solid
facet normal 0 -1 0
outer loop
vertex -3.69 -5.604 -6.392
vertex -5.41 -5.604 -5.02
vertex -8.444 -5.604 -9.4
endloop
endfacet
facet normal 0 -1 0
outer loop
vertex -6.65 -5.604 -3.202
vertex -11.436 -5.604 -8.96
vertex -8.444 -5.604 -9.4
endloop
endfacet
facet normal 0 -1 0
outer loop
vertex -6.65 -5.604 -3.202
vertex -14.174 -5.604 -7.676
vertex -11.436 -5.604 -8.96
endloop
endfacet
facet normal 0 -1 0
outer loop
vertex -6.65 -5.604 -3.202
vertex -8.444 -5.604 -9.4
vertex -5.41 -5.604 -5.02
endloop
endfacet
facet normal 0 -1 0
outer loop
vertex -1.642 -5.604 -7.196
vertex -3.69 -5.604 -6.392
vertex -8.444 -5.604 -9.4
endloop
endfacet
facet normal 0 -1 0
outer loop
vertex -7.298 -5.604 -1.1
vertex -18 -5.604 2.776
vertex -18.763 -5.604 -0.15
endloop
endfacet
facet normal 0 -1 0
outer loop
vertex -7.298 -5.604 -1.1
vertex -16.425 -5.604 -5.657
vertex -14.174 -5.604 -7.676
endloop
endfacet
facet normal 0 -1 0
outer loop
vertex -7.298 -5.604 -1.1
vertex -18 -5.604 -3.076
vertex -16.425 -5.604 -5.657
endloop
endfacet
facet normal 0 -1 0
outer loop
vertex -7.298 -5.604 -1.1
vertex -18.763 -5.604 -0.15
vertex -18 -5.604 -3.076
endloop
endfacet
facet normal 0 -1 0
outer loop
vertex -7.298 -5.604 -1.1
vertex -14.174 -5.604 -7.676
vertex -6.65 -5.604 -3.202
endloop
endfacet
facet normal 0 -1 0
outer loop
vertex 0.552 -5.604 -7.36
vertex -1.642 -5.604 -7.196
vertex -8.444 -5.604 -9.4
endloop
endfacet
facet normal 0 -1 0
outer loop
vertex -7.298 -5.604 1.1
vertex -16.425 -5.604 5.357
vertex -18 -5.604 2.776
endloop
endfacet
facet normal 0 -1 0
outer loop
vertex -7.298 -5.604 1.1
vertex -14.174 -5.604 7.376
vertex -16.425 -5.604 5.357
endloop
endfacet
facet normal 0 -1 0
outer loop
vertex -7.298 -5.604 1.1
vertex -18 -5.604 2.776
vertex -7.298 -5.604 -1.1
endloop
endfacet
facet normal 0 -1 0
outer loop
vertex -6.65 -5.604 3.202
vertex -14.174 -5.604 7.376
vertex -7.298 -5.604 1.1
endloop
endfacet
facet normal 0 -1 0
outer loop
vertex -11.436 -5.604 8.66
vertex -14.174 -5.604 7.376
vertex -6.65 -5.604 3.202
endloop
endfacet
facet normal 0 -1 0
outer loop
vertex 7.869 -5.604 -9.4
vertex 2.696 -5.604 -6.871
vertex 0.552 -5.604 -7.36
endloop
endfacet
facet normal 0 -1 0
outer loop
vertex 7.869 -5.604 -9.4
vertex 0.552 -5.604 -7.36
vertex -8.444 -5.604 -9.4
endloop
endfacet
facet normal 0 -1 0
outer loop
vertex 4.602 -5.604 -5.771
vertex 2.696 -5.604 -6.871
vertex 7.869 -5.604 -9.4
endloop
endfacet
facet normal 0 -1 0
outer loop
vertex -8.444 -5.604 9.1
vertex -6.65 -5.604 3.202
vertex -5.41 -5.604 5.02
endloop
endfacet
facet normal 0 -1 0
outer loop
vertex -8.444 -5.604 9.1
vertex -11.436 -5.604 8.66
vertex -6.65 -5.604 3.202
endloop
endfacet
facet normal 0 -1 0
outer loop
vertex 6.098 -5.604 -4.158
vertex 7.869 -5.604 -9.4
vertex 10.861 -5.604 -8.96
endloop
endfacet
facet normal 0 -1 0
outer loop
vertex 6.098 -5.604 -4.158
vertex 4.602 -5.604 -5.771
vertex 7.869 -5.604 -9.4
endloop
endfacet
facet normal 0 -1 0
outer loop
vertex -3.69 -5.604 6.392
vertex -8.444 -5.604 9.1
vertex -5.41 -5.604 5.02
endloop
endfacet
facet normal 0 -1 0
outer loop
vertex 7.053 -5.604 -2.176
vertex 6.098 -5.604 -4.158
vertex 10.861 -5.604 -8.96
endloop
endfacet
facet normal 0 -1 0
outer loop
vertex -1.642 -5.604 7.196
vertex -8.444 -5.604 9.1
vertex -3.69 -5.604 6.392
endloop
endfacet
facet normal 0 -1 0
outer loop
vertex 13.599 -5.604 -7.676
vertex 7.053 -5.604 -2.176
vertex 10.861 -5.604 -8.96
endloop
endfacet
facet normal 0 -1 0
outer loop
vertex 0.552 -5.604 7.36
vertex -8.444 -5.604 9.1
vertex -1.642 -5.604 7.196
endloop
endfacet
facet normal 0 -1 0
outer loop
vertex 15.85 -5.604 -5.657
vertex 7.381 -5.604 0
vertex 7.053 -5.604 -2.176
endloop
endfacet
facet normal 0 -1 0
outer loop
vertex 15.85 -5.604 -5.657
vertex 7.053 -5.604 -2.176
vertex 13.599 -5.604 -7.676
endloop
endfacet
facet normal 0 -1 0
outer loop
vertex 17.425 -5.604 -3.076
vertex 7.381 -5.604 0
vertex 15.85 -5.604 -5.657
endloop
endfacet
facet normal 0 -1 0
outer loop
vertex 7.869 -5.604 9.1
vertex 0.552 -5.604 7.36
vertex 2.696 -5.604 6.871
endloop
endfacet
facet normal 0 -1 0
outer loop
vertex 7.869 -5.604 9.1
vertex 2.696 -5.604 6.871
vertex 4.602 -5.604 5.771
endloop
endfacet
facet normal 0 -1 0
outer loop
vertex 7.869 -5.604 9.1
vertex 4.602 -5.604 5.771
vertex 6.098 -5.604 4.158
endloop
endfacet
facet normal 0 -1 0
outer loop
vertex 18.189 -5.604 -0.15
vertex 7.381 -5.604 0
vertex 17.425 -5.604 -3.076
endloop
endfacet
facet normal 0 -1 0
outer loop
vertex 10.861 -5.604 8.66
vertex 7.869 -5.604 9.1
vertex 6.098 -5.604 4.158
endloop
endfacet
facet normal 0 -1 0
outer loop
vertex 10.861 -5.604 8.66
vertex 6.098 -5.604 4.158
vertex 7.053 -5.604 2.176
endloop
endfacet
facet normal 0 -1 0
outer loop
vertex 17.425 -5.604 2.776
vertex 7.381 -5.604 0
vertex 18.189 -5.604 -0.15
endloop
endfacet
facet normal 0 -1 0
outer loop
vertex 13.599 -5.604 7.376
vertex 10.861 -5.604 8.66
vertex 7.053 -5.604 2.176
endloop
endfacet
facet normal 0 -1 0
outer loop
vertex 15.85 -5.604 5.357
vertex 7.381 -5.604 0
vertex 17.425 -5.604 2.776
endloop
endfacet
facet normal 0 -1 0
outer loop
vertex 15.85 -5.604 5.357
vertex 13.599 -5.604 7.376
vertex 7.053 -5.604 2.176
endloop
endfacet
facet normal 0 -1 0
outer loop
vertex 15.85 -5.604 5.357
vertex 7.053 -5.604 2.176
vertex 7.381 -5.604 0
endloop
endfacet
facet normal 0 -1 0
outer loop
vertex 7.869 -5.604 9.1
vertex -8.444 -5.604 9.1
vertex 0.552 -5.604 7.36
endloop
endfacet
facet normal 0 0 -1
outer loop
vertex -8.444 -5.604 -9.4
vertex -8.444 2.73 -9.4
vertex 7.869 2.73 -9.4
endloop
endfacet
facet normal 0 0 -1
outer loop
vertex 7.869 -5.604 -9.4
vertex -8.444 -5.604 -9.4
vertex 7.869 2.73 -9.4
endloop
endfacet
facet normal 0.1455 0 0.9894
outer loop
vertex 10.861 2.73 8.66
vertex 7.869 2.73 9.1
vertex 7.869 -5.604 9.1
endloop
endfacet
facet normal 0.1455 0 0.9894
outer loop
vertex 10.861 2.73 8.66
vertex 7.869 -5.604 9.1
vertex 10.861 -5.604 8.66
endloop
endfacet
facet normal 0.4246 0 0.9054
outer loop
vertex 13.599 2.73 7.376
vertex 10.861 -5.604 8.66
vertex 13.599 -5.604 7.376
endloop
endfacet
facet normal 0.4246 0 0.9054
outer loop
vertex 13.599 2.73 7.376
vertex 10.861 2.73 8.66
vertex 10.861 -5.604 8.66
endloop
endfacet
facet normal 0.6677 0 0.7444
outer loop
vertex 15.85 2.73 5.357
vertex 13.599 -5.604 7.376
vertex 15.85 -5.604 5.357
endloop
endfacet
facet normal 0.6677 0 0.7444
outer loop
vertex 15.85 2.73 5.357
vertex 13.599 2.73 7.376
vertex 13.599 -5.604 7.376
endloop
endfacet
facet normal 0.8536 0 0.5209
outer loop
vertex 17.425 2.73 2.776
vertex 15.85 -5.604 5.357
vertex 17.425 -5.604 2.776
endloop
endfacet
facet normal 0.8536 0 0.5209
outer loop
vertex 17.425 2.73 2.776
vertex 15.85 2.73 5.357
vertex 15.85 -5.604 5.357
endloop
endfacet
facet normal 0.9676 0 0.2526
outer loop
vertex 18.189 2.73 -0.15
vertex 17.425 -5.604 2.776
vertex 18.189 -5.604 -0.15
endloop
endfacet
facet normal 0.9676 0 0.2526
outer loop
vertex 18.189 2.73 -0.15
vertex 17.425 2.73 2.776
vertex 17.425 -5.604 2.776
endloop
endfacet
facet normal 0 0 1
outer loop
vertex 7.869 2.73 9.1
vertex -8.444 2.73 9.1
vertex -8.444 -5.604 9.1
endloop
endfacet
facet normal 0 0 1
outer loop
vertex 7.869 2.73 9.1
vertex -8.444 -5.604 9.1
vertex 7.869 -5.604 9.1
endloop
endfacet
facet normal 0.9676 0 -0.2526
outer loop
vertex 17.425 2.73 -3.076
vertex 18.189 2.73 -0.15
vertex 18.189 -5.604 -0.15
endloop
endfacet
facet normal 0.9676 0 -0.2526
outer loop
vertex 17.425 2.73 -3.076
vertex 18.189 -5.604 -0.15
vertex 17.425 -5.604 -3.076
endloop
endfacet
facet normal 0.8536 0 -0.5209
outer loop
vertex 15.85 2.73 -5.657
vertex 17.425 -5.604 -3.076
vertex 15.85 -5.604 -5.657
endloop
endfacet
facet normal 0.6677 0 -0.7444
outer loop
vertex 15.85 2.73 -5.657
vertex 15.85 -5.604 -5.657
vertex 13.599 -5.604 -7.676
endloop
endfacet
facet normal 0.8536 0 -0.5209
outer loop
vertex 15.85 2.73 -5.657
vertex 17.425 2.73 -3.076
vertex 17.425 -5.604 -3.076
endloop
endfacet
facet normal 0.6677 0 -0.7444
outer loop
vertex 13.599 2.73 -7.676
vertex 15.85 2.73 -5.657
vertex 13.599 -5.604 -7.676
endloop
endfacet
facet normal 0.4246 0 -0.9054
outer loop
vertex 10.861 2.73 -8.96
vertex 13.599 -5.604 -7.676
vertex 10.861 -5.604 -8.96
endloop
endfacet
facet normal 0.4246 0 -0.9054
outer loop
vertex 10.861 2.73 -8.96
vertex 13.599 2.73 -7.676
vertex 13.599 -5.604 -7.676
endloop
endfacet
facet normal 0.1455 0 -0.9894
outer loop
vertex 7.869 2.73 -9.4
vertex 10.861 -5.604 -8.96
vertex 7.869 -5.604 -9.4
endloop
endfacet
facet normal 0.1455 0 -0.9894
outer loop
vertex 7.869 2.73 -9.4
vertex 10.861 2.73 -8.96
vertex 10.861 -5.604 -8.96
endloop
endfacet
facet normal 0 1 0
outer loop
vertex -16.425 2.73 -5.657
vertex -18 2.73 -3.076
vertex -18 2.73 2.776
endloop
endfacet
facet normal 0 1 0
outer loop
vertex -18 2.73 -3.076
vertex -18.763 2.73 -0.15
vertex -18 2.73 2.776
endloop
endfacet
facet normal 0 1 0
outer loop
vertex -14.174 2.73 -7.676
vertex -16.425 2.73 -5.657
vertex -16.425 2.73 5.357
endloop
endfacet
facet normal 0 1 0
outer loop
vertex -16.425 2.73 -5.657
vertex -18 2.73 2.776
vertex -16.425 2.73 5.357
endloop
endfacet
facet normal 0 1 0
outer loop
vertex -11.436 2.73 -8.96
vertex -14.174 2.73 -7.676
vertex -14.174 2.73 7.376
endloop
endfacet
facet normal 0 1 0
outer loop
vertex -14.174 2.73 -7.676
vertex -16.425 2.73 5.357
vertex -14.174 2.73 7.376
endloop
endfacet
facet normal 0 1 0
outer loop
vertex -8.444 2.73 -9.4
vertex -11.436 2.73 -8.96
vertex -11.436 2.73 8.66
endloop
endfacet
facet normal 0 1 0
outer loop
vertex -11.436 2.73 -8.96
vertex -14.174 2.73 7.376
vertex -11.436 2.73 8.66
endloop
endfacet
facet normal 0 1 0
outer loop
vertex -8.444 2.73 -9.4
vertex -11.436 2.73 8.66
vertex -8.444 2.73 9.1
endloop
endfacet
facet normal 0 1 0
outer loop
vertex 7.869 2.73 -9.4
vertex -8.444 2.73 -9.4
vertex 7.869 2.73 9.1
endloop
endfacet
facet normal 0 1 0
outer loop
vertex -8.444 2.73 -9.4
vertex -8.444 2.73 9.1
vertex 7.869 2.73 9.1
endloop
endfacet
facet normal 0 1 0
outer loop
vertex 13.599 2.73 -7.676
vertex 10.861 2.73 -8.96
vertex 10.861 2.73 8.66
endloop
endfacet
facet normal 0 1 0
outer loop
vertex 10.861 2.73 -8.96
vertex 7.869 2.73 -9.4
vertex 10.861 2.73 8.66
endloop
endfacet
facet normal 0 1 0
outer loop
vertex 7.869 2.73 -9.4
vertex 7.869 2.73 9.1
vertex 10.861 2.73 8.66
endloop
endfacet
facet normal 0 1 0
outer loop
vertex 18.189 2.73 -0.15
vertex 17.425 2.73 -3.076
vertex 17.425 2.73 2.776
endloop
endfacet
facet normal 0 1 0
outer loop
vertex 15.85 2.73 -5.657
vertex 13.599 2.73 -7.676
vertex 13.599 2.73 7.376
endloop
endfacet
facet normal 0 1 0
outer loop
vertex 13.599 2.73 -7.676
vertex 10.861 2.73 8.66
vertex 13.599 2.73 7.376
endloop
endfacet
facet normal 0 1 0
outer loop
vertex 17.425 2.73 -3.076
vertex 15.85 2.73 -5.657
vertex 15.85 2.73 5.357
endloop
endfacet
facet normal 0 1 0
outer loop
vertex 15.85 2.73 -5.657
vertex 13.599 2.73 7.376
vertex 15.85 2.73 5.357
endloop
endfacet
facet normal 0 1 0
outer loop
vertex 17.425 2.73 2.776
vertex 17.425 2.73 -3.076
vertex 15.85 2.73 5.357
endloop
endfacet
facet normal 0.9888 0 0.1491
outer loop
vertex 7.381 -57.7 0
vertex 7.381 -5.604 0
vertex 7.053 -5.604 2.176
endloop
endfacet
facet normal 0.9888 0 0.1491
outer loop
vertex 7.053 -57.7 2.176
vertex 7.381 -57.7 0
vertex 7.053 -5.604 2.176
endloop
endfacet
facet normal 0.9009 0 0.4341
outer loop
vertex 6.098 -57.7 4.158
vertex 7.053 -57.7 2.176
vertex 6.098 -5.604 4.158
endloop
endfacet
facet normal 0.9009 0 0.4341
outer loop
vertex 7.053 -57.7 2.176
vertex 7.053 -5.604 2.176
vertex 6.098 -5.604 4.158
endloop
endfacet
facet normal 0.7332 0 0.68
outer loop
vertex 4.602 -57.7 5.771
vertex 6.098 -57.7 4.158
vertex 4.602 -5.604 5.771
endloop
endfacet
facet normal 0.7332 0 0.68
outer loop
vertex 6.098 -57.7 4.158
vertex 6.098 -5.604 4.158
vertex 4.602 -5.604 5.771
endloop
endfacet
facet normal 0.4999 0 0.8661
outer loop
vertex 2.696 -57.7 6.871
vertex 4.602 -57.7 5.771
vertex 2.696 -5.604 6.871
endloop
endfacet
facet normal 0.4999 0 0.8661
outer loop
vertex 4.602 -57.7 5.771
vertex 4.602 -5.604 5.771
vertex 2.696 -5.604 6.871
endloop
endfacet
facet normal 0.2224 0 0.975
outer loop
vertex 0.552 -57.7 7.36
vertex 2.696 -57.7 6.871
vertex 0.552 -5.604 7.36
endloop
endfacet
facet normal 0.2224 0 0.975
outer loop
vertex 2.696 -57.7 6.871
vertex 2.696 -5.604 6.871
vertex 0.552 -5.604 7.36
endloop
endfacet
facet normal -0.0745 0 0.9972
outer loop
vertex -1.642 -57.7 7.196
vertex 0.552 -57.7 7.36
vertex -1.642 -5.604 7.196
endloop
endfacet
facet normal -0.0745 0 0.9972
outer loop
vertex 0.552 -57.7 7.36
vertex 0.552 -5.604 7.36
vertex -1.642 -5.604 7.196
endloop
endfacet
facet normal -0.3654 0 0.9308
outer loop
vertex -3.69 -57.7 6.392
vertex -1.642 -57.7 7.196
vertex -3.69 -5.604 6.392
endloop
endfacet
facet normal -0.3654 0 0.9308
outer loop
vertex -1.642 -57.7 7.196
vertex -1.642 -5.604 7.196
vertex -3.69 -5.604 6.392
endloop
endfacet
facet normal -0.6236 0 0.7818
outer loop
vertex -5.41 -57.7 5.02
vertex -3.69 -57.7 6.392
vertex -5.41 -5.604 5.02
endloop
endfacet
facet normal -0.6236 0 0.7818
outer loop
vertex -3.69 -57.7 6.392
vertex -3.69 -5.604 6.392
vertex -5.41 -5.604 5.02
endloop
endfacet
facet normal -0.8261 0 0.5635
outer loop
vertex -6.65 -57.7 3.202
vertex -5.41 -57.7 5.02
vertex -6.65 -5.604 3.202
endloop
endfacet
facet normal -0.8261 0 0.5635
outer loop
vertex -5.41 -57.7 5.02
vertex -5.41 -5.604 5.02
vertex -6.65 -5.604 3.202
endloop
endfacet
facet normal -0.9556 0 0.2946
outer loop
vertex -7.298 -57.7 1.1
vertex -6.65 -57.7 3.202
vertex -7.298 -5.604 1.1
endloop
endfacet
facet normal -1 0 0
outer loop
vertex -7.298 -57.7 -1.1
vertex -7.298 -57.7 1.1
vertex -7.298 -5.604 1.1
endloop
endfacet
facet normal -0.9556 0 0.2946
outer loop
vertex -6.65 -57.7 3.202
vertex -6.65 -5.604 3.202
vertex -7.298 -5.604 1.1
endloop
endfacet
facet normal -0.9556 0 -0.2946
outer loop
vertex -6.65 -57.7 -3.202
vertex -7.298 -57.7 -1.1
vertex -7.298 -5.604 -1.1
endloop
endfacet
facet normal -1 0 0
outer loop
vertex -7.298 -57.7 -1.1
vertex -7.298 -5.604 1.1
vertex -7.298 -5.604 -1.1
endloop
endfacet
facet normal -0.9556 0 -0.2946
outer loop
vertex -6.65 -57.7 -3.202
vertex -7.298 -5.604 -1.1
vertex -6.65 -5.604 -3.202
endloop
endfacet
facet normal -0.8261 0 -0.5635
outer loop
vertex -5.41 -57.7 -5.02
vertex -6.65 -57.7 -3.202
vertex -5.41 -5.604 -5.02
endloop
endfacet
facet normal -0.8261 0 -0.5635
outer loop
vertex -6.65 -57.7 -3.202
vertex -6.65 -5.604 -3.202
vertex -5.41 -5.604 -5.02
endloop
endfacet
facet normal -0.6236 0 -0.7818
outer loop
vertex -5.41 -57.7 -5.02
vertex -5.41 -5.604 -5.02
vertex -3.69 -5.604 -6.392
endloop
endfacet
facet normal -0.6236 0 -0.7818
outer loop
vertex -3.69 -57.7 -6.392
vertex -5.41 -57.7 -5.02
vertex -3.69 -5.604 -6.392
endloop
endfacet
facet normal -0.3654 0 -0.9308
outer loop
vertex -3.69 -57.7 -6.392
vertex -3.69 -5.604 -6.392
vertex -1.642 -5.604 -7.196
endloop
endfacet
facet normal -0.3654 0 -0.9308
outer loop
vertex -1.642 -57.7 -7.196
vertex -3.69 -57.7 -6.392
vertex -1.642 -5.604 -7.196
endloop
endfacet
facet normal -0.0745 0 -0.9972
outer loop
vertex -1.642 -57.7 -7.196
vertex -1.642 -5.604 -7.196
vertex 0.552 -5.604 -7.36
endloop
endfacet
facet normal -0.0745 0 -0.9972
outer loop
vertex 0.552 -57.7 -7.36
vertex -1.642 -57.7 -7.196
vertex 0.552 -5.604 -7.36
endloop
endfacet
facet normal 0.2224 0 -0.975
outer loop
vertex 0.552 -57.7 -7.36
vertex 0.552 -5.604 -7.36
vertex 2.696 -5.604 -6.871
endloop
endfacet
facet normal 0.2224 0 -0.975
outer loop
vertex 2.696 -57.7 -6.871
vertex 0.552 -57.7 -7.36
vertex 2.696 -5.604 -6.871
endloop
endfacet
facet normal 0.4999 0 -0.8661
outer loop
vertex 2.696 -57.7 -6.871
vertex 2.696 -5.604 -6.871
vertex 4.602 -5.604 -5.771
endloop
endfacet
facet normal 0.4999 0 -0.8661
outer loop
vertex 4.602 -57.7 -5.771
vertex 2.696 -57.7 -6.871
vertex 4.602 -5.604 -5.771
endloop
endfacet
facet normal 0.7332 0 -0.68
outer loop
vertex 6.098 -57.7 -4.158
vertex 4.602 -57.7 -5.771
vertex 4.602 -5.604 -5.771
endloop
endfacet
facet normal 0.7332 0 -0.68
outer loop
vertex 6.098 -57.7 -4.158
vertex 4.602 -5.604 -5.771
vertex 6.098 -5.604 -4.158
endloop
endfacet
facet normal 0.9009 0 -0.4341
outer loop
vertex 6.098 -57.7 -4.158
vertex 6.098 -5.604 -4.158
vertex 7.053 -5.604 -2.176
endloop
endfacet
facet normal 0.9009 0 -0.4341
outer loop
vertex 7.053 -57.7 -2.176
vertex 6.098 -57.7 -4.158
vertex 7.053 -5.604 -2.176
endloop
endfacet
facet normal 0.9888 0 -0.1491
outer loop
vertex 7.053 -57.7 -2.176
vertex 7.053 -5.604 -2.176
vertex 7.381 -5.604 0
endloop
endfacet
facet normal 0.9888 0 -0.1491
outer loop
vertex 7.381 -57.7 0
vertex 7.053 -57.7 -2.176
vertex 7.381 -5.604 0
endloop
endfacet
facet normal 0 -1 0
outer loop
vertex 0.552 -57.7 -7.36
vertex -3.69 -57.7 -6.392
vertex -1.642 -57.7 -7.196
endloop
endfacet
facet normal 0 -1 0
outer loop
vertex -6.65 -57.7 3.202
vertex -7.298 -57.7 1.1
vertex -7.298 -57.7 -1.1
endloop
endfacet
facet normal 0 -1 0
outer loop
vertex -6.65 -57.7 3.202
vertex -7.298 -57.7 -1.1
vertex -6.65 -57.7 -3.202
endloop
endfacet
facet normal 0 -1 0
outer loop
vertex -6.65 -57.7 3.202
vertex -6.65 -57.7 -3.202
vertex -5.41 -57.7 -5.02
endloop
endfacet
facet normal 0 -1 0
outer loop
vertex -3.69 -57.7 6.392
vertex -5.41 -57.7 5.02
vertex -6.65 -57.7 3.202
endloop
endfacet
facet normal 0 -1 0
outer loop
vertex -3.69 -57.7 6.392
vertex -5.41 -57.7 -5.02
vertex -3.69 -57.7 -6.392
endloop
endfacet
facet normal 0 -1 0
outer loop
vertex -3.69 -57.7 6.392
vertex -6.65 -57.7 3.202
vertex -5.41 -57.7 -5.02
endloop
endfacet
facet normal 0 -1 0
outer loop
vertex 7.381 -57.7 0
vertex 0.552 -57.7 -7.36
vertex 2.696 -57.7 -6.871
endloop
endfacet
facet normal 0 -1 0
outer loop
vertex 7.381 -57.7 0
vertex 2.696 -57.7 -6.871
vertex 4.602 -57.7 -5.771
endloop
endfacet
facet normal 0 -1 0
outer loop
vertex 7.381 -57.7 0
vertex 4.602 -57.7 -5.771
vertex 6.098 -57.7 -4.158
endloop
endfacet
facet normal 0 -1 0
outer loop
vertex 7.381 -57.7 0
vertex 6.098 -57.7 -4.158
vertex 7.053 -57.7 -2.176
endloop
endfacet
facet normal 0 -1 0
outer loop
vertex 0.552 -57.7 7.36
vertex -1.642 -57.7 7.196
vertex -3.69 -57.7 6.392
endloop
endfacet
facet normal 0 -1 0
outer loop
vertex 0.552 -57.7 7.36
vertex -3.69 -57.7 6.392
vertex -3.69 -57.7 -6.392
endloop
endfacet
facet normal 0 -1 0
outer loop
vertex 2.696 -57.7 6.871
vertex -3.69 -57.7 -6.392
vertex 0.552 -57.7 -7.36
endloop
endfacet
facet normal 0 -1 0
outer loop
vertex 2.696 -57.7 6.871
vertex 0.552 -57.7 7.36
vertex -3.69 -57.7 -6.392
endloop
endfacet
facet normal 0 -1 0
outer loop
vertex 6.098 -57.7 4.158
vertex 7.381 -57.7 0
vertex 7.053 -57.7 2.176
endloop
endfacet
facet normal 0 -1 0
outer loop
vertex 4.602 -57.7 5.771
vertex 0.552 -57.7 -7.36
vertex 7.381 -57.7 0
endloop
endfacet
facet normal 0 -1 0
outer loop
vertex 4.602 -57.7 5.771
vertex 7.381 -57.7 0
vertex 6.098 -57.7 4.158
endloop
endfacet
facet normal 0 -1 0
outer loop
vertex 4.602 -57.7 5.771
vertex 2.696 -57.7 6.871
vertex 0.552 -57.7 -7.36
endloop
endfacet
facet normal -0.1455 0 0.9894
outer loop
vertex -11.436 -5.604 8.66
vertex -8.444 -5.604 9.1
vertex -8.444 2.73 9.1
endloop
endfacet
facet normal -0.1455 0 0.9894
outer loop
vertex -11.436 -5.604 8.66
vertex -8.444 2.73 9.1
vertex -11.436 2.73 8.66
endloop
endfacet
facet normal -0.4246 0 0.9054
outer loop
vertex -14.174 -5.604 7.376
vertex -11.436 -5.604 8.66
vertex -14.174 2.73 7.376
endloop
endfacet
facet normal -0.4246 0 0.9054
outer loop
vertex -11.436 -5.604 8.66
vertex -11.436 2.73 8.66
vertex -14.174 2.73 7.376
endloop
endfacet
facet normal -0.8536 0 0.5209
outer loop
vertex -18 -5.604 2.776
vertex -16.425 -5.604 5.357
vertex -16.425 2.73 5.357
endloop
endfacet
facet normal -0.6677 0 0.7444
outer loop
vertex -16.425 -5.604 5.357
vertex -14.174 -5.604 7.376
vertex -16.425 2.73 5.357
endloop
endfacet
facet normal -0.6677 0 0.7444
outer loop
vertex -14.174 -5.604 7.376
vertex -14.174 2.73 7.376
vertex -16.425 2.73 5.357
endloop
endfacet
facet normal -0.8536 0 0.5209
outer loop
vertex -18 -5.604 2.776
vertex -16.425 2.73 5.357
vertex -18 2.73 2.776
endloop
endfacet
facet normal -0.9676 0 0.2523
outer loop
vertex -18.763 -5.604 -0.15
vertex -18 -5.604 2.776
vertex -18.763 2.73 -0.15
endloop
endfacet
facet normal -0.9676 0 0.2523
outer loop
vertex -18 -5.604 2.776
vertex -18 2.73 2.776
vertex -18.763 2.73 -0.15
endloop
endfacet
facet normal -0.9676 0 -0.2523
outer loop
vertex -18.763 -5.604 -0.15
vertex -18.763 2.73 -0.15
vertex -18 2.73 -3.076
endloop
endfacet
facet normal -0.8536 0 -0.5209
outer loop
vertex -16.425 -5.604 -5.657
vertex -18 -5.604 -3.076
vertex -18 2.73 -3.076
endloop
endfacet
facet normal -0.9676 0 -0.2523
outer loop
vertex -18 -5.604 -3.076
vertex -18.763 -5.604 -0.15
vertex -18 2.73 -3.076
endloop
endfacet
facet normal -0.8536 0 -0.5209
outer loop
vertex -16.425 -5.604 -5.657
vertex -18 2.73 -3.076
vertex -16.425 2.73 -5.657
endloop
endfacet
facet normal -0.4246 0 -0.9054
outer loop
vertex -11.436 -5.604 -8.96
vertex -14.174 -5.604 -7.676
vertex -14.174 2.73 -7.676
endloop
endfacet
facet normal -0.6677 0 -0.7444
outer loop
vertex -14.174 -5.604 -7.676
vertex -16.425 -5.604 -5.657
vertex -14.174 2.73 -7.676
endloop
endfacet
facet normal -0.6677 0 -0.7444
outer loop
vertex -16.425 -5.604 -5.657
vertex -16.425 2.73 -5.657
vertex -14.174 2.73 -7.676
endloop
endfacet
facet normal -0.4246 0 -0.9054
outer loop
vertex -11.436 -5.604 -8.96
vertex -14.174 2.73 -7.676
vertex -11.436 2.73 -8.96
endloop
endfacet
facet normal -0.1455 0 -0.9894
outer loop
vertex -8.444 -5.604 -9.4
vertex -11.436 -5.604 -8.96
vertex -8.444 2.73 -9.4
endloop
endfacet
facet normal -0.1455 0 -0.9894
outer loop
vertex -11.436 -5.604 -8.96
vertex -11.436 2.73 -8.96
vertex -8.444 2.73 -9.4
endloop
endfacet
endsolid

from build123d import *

# Parameters (mm, degrees)
F0_R          = 7.380765
F1_DEPTH      = 57.7
F2_W          = 37.0757319033
F2_H          = 8.3348543849
F3_DEPTH      = 9.1
F3_DEPTH_BACK = 9.4
F4_T1_DEPTH   = 60.2404459759


# Not quite as in the source:
# - a fillet or chamfer that OpenCascade refuses, or shapes differently, is made with other operations: its cross-section is extruded or revolved along the edge and cut away or added


with BuildPart() as f1:
    # F0 (on Front) → F1 (new body)
    with BuildSketch(Plane.XZ):
        Circle(F0_R)
    extrude(amount=F1_DEPTH)

    # F2 (on Top) → F3 (join, two sides)
    with BuildSketch(Plane.XY) as f3_sk:
        with Locations((-0.2874098718, -1.4370438876)):
            Rectangle(F2_W, F2_H)
    extrude(amount=F3_DEPTH)
    extrude(f3_sk.sketch, amount=-F3_DEPTH_BACK)

    # F4: fillet of radius 10.3811183182 on 4 edges, made by hand

    # F4_s2 → F4_t1 (cut)
    with BuildSketch(Plane.XZ.offset(-28.6831791004)):
        with BuildLine():
            ThreePointArc((-18.8252758235, 0.9811183182), (-15.7847166644, -6.3594408409), (-8.4441575053, -9.4))
            Line((-8.4441575053, -9.4), (-18.8252758235, -9.4))
            Line((-18.8252758235, -9.4), (-18.8252758235, 0.9811183182))
        make_face()
        with BuildLine():
            ThreePointArc((-8.4441575053, 9.1), (-15.7847166644, 6.0594408409), (-18.8252758235, -1.2811183182))
            Line((-18.8252758235, -1.2811183182), (-18.8252758235, 9.1))
            Line((-18.8252758235, 9.1), (-8.4441575053, 9.1))
        make_face()
        with BuildLine():
            ThreePointArc((7.8693377616, 9.1), (15.2098969207, 6.0594408409), (18.2504560798, -1.2811183182))
            Line((18.2504560798, -1.2811183182), (18.2504560798, 9.1))
            Line((18.2504560798, 9.1), (7.8693377616, 9.1))
        make_face()
        with BuildLine():
            ThreePointArc((18.2504560798, 0.9811183182), (15.2098969207, -6.3594408409), (7.8693377616, -9.4))
            Line((7.8693377616, -9.4), (18.2504560798, -9.4))
            Line((18.2504560798, -9.4), (18.2504560798, 0.9811183182))
        make_face()
    extrude(amount=F4_T1_DEPTH, mode=Mode.SUBTRACT)


solid = f1.part
